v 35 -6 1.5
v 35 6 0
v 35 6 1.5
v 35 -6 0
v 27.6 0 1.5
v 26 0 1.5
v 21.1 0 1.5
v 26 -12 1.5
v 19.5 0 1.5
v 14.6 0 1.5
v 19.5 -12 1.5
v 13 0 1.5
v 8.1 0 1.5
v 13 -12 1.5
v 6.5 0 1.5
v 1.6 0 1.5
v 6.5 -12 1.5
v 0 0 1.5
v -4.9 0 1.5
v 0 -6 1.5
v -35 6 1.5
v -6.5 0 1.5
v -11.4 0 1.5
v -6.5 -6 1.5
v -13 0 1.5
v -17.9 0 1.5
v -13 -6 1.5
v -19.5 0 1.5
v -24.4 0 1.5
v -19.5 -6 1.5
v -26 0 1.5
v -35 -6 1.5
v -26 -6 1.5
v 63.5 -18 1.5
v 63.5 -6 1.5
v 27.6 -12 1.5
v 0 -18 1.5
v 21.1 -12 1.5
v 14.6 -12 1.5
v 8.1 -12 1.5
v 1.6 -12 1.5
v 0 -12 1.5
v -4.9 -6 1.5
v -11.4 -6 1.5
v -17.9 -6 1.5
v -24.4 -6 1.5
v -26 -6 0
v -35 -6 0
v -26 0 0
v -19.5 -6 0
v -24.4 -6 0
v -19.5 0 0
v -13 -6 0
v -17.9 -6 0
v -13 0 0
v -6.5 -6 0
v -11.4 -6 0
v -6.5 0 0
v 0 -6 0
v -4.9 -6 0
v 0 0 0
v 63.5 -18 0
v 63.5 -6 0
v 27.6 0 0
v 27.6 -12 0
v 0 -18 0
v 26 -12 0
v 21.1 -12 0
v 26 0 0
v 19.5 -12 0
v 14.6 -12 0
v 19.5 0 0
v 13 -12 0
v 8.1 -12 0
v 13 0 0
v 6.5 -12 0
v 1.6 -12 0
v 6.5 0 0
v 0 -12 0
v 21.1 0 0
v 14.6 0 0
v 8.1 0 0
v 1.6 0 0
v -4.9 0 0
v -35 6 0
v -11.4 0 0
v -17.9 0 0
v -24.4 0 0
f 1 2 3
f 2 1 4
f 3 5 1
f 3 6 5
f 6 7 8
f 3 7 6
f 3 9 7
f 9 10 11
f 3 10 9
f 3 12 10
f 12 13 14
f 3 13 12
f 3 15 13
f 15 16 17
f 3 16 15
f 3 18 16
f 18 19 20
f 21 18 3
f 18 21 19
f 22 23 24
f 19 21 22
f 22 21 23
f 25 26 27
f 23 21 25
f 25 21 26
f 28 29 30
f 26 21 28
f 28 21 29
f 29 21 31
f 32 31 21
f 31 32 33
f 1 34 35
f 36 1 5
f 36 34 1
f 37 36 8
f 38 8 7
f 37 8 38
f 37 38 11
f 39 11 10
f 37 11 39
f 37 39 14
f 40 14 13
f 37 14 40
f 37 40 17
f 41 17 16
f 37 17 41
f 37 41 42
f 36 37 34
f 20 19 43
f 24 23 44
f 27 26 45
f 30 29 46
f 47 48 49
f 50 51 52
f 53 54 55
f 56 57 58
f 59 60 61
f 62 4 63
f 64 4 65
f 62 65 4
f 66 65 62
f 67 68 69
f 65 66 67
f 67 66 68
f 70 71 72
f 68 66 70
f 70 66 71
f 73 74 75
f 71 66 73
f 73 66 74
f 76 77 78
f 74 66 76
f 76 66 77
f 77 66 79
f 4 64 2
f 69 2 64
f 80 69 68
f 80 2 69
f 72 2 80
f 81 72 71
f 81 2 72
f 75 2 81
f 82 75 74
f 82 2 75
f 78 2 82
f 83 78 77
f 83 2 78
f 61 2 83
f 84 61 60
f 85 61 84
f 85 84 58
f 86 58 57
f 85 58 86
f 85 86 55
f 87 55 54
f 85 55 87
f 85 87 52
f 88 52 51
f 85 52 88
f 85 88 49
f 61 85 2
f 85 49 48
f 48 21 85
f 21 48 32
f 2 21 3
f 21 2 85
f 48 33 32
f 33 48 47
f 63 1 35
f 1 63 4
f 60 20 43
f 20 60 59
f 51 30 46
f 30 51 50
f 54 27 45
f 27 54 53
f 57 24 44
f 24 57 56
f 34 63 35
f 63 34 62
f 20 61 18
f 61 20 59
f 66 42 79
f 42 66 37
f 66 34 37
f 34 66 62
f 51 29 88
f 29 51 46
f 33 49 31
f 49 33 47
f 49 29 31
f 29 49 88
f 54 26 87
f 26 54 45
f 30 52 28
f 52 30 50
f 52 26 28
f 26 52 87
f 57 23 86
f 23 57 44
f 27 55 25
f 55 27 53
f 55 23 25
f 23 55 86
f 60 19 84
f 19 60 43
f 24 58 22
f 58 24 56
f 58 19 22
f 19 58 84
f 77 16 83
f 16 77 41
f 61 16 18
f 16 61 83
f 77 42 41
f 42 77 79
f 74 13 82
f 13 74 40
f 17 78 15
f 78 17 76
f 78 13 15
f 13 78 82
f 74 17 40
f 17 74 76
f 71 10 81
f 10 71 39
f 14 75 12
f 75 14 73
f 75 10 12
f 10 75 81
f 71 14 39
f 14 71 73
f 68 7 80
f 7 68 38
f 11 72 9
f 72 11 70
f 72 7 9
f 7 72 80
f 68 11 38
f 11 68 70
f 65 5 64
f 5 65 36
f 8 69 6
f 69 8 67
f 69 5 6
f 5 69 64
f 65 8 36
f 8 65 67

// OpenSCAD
// 10-well agarose gel comb - flat plate with spine and hanging teeth.
// Orientation: Lying flat on XY plane, spine along X, teeth hanging in -Y.

// Dimensions
spine_len = 70;   // Length of the spine (X)
spine_w   = 12;   // Width of the spine (Y)
thickness = 1.5;  // Thickness of the plate (Z)

tooth_w   = 5.0;  // Width of each tooth (X)
tooth_h   = 12;   // Length of each tooth (Y)
gap       = 1.5;  // Gap between teeth (X)
n_teeth   = 10;   // Number of teeth

$fn = 64;

// Calculate total width of the tooth row
tooth_row_w = n_teeth * tooth_w + (n_teeth - 1) * gap;

// Calculate offset to centre the tooth row on the spine
// Spine is 12mm wide. Tooth row is centered on the spine's centerline.
// The teeth hang from the -Y edge of the spine.
// Spine Y range: [-6, 6]. Teeth start at Y = -6 and extend to Y = -6 - tooth_h.
// The X-centre of the tooth row must match the X-centre of the spine (0).
tooth_row_offset_x = 0; 

// Define the main body (spine)
// The spine is a simple rectangular prism.
// It sits on Z=0.
// X range: [-spine_len/2, spine_len/2]
// Y range: [-spine_w/2, spine_w/2]
// Z range: [0, thickness]

difference() {
    union() {
        // 1. The Spine
        translate([-spine_len / 2, -spine_w / 2, 0]) 
            cube([spine_len, spine_w, thickness]);

        // 2. The Teeth
        // We create the teeth as a single block to ensure they are perfectly coplanar with the spine top.
        // The teeth block starts at the -Y edge of the spine and extends downwards.
        // X range: [-tooth_row_w/2, tooth_row_w/2]
        // Y range: [-spine_w/2 - tooth_h, -spine_w/2]
        // Z range: [0, thickness]
        
        translate([tooth_row_offset_x, -spine_w / 2 - tooth_h, 0])
            cube([tooth_row_w, tooth_h, thickness]);
    }
    
    // Cut out the gaps between teeth
    // We iterate through the gaps. There are n_teeth - 1 gaps.
    // Gap i (0-indexed) is between tooth i and tooth i+1.
    // Position of gap i relative to the start of the tooth row:
    // Start of tooth 0 is at -tooth_row_w/2.
    // Width of tooth 0 is tooth_w.
    // So gap 0 starts at -tooth_row_w/2 + tooth_w.
    
    for (i = [0 : n_teeth - 2]) {
        // Calculate X position of the gap
        // Start of the row
        row_start = -tooth_row_w / 2;
        
        // Position of the gap center
        // Each gap is 'gap' wide.
        // Gap 0 starts at row_start + tooth_w
        // Gap 1 starts at row_start + tooth_w + gap
        // Gap i starts at row_start + (i + 1) * tooth_w + i * gap
        
        gap_x_start = row_start + (i + 1) * tooth_w + i * gap;
        gap_x_center = gap_x_start + gap / 2;
        
        // Cut a slot through the teeth block
        // The slot must be slightly wider than the gap to ensure clean separation
        // We cut a rectangle of width (gap + 0.1)
        translate([gap_x_center, -spine_w / 2 - tooth_h / 2, -0.1])
            cube([gap + 0.1, tooth_h, thickness + 0.1]);
    }
}
